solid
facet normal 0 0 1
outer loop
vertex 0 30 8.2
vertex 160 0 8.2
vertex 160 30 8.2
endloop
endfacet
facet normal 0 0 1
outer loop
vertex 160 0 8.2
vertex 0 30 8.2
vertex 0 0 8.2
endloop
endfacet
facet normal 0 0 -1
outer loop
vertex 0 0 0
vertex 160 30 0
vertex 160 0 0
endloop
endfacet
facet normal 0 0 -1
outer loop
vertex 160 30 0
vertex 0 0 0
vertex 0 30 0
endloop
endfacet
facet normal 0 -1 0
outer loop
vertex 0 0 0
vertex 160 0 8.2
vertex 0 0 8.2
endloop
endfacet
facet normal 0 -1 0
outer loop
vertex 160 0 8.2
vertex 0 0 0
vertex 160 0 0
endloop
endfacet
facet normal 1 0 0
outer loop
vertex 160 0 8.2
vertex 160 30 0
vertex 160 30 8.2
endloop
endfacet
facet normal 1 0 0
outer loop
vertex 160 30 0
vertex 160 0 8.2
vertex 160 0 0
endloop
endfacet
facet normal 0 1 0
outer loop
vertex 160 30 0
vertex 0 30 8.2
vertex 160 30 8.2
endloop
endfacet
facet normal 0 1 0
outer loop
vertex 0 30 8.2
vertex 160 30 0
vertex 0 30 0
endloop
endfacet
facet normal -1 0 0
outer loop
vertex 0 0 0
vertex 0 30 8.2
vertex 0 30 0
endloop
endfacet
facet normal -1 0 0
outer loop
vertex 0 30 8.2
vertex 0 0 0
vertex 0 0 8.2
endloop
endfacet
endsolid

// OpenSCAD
// ScienceClaw solid_bar; nominal millimeters. Printer process requires validation.
length = 160;
width = 30;
height = 8.2;
thickness = 1.2;
difference() { cube([length,width,height]);  }
